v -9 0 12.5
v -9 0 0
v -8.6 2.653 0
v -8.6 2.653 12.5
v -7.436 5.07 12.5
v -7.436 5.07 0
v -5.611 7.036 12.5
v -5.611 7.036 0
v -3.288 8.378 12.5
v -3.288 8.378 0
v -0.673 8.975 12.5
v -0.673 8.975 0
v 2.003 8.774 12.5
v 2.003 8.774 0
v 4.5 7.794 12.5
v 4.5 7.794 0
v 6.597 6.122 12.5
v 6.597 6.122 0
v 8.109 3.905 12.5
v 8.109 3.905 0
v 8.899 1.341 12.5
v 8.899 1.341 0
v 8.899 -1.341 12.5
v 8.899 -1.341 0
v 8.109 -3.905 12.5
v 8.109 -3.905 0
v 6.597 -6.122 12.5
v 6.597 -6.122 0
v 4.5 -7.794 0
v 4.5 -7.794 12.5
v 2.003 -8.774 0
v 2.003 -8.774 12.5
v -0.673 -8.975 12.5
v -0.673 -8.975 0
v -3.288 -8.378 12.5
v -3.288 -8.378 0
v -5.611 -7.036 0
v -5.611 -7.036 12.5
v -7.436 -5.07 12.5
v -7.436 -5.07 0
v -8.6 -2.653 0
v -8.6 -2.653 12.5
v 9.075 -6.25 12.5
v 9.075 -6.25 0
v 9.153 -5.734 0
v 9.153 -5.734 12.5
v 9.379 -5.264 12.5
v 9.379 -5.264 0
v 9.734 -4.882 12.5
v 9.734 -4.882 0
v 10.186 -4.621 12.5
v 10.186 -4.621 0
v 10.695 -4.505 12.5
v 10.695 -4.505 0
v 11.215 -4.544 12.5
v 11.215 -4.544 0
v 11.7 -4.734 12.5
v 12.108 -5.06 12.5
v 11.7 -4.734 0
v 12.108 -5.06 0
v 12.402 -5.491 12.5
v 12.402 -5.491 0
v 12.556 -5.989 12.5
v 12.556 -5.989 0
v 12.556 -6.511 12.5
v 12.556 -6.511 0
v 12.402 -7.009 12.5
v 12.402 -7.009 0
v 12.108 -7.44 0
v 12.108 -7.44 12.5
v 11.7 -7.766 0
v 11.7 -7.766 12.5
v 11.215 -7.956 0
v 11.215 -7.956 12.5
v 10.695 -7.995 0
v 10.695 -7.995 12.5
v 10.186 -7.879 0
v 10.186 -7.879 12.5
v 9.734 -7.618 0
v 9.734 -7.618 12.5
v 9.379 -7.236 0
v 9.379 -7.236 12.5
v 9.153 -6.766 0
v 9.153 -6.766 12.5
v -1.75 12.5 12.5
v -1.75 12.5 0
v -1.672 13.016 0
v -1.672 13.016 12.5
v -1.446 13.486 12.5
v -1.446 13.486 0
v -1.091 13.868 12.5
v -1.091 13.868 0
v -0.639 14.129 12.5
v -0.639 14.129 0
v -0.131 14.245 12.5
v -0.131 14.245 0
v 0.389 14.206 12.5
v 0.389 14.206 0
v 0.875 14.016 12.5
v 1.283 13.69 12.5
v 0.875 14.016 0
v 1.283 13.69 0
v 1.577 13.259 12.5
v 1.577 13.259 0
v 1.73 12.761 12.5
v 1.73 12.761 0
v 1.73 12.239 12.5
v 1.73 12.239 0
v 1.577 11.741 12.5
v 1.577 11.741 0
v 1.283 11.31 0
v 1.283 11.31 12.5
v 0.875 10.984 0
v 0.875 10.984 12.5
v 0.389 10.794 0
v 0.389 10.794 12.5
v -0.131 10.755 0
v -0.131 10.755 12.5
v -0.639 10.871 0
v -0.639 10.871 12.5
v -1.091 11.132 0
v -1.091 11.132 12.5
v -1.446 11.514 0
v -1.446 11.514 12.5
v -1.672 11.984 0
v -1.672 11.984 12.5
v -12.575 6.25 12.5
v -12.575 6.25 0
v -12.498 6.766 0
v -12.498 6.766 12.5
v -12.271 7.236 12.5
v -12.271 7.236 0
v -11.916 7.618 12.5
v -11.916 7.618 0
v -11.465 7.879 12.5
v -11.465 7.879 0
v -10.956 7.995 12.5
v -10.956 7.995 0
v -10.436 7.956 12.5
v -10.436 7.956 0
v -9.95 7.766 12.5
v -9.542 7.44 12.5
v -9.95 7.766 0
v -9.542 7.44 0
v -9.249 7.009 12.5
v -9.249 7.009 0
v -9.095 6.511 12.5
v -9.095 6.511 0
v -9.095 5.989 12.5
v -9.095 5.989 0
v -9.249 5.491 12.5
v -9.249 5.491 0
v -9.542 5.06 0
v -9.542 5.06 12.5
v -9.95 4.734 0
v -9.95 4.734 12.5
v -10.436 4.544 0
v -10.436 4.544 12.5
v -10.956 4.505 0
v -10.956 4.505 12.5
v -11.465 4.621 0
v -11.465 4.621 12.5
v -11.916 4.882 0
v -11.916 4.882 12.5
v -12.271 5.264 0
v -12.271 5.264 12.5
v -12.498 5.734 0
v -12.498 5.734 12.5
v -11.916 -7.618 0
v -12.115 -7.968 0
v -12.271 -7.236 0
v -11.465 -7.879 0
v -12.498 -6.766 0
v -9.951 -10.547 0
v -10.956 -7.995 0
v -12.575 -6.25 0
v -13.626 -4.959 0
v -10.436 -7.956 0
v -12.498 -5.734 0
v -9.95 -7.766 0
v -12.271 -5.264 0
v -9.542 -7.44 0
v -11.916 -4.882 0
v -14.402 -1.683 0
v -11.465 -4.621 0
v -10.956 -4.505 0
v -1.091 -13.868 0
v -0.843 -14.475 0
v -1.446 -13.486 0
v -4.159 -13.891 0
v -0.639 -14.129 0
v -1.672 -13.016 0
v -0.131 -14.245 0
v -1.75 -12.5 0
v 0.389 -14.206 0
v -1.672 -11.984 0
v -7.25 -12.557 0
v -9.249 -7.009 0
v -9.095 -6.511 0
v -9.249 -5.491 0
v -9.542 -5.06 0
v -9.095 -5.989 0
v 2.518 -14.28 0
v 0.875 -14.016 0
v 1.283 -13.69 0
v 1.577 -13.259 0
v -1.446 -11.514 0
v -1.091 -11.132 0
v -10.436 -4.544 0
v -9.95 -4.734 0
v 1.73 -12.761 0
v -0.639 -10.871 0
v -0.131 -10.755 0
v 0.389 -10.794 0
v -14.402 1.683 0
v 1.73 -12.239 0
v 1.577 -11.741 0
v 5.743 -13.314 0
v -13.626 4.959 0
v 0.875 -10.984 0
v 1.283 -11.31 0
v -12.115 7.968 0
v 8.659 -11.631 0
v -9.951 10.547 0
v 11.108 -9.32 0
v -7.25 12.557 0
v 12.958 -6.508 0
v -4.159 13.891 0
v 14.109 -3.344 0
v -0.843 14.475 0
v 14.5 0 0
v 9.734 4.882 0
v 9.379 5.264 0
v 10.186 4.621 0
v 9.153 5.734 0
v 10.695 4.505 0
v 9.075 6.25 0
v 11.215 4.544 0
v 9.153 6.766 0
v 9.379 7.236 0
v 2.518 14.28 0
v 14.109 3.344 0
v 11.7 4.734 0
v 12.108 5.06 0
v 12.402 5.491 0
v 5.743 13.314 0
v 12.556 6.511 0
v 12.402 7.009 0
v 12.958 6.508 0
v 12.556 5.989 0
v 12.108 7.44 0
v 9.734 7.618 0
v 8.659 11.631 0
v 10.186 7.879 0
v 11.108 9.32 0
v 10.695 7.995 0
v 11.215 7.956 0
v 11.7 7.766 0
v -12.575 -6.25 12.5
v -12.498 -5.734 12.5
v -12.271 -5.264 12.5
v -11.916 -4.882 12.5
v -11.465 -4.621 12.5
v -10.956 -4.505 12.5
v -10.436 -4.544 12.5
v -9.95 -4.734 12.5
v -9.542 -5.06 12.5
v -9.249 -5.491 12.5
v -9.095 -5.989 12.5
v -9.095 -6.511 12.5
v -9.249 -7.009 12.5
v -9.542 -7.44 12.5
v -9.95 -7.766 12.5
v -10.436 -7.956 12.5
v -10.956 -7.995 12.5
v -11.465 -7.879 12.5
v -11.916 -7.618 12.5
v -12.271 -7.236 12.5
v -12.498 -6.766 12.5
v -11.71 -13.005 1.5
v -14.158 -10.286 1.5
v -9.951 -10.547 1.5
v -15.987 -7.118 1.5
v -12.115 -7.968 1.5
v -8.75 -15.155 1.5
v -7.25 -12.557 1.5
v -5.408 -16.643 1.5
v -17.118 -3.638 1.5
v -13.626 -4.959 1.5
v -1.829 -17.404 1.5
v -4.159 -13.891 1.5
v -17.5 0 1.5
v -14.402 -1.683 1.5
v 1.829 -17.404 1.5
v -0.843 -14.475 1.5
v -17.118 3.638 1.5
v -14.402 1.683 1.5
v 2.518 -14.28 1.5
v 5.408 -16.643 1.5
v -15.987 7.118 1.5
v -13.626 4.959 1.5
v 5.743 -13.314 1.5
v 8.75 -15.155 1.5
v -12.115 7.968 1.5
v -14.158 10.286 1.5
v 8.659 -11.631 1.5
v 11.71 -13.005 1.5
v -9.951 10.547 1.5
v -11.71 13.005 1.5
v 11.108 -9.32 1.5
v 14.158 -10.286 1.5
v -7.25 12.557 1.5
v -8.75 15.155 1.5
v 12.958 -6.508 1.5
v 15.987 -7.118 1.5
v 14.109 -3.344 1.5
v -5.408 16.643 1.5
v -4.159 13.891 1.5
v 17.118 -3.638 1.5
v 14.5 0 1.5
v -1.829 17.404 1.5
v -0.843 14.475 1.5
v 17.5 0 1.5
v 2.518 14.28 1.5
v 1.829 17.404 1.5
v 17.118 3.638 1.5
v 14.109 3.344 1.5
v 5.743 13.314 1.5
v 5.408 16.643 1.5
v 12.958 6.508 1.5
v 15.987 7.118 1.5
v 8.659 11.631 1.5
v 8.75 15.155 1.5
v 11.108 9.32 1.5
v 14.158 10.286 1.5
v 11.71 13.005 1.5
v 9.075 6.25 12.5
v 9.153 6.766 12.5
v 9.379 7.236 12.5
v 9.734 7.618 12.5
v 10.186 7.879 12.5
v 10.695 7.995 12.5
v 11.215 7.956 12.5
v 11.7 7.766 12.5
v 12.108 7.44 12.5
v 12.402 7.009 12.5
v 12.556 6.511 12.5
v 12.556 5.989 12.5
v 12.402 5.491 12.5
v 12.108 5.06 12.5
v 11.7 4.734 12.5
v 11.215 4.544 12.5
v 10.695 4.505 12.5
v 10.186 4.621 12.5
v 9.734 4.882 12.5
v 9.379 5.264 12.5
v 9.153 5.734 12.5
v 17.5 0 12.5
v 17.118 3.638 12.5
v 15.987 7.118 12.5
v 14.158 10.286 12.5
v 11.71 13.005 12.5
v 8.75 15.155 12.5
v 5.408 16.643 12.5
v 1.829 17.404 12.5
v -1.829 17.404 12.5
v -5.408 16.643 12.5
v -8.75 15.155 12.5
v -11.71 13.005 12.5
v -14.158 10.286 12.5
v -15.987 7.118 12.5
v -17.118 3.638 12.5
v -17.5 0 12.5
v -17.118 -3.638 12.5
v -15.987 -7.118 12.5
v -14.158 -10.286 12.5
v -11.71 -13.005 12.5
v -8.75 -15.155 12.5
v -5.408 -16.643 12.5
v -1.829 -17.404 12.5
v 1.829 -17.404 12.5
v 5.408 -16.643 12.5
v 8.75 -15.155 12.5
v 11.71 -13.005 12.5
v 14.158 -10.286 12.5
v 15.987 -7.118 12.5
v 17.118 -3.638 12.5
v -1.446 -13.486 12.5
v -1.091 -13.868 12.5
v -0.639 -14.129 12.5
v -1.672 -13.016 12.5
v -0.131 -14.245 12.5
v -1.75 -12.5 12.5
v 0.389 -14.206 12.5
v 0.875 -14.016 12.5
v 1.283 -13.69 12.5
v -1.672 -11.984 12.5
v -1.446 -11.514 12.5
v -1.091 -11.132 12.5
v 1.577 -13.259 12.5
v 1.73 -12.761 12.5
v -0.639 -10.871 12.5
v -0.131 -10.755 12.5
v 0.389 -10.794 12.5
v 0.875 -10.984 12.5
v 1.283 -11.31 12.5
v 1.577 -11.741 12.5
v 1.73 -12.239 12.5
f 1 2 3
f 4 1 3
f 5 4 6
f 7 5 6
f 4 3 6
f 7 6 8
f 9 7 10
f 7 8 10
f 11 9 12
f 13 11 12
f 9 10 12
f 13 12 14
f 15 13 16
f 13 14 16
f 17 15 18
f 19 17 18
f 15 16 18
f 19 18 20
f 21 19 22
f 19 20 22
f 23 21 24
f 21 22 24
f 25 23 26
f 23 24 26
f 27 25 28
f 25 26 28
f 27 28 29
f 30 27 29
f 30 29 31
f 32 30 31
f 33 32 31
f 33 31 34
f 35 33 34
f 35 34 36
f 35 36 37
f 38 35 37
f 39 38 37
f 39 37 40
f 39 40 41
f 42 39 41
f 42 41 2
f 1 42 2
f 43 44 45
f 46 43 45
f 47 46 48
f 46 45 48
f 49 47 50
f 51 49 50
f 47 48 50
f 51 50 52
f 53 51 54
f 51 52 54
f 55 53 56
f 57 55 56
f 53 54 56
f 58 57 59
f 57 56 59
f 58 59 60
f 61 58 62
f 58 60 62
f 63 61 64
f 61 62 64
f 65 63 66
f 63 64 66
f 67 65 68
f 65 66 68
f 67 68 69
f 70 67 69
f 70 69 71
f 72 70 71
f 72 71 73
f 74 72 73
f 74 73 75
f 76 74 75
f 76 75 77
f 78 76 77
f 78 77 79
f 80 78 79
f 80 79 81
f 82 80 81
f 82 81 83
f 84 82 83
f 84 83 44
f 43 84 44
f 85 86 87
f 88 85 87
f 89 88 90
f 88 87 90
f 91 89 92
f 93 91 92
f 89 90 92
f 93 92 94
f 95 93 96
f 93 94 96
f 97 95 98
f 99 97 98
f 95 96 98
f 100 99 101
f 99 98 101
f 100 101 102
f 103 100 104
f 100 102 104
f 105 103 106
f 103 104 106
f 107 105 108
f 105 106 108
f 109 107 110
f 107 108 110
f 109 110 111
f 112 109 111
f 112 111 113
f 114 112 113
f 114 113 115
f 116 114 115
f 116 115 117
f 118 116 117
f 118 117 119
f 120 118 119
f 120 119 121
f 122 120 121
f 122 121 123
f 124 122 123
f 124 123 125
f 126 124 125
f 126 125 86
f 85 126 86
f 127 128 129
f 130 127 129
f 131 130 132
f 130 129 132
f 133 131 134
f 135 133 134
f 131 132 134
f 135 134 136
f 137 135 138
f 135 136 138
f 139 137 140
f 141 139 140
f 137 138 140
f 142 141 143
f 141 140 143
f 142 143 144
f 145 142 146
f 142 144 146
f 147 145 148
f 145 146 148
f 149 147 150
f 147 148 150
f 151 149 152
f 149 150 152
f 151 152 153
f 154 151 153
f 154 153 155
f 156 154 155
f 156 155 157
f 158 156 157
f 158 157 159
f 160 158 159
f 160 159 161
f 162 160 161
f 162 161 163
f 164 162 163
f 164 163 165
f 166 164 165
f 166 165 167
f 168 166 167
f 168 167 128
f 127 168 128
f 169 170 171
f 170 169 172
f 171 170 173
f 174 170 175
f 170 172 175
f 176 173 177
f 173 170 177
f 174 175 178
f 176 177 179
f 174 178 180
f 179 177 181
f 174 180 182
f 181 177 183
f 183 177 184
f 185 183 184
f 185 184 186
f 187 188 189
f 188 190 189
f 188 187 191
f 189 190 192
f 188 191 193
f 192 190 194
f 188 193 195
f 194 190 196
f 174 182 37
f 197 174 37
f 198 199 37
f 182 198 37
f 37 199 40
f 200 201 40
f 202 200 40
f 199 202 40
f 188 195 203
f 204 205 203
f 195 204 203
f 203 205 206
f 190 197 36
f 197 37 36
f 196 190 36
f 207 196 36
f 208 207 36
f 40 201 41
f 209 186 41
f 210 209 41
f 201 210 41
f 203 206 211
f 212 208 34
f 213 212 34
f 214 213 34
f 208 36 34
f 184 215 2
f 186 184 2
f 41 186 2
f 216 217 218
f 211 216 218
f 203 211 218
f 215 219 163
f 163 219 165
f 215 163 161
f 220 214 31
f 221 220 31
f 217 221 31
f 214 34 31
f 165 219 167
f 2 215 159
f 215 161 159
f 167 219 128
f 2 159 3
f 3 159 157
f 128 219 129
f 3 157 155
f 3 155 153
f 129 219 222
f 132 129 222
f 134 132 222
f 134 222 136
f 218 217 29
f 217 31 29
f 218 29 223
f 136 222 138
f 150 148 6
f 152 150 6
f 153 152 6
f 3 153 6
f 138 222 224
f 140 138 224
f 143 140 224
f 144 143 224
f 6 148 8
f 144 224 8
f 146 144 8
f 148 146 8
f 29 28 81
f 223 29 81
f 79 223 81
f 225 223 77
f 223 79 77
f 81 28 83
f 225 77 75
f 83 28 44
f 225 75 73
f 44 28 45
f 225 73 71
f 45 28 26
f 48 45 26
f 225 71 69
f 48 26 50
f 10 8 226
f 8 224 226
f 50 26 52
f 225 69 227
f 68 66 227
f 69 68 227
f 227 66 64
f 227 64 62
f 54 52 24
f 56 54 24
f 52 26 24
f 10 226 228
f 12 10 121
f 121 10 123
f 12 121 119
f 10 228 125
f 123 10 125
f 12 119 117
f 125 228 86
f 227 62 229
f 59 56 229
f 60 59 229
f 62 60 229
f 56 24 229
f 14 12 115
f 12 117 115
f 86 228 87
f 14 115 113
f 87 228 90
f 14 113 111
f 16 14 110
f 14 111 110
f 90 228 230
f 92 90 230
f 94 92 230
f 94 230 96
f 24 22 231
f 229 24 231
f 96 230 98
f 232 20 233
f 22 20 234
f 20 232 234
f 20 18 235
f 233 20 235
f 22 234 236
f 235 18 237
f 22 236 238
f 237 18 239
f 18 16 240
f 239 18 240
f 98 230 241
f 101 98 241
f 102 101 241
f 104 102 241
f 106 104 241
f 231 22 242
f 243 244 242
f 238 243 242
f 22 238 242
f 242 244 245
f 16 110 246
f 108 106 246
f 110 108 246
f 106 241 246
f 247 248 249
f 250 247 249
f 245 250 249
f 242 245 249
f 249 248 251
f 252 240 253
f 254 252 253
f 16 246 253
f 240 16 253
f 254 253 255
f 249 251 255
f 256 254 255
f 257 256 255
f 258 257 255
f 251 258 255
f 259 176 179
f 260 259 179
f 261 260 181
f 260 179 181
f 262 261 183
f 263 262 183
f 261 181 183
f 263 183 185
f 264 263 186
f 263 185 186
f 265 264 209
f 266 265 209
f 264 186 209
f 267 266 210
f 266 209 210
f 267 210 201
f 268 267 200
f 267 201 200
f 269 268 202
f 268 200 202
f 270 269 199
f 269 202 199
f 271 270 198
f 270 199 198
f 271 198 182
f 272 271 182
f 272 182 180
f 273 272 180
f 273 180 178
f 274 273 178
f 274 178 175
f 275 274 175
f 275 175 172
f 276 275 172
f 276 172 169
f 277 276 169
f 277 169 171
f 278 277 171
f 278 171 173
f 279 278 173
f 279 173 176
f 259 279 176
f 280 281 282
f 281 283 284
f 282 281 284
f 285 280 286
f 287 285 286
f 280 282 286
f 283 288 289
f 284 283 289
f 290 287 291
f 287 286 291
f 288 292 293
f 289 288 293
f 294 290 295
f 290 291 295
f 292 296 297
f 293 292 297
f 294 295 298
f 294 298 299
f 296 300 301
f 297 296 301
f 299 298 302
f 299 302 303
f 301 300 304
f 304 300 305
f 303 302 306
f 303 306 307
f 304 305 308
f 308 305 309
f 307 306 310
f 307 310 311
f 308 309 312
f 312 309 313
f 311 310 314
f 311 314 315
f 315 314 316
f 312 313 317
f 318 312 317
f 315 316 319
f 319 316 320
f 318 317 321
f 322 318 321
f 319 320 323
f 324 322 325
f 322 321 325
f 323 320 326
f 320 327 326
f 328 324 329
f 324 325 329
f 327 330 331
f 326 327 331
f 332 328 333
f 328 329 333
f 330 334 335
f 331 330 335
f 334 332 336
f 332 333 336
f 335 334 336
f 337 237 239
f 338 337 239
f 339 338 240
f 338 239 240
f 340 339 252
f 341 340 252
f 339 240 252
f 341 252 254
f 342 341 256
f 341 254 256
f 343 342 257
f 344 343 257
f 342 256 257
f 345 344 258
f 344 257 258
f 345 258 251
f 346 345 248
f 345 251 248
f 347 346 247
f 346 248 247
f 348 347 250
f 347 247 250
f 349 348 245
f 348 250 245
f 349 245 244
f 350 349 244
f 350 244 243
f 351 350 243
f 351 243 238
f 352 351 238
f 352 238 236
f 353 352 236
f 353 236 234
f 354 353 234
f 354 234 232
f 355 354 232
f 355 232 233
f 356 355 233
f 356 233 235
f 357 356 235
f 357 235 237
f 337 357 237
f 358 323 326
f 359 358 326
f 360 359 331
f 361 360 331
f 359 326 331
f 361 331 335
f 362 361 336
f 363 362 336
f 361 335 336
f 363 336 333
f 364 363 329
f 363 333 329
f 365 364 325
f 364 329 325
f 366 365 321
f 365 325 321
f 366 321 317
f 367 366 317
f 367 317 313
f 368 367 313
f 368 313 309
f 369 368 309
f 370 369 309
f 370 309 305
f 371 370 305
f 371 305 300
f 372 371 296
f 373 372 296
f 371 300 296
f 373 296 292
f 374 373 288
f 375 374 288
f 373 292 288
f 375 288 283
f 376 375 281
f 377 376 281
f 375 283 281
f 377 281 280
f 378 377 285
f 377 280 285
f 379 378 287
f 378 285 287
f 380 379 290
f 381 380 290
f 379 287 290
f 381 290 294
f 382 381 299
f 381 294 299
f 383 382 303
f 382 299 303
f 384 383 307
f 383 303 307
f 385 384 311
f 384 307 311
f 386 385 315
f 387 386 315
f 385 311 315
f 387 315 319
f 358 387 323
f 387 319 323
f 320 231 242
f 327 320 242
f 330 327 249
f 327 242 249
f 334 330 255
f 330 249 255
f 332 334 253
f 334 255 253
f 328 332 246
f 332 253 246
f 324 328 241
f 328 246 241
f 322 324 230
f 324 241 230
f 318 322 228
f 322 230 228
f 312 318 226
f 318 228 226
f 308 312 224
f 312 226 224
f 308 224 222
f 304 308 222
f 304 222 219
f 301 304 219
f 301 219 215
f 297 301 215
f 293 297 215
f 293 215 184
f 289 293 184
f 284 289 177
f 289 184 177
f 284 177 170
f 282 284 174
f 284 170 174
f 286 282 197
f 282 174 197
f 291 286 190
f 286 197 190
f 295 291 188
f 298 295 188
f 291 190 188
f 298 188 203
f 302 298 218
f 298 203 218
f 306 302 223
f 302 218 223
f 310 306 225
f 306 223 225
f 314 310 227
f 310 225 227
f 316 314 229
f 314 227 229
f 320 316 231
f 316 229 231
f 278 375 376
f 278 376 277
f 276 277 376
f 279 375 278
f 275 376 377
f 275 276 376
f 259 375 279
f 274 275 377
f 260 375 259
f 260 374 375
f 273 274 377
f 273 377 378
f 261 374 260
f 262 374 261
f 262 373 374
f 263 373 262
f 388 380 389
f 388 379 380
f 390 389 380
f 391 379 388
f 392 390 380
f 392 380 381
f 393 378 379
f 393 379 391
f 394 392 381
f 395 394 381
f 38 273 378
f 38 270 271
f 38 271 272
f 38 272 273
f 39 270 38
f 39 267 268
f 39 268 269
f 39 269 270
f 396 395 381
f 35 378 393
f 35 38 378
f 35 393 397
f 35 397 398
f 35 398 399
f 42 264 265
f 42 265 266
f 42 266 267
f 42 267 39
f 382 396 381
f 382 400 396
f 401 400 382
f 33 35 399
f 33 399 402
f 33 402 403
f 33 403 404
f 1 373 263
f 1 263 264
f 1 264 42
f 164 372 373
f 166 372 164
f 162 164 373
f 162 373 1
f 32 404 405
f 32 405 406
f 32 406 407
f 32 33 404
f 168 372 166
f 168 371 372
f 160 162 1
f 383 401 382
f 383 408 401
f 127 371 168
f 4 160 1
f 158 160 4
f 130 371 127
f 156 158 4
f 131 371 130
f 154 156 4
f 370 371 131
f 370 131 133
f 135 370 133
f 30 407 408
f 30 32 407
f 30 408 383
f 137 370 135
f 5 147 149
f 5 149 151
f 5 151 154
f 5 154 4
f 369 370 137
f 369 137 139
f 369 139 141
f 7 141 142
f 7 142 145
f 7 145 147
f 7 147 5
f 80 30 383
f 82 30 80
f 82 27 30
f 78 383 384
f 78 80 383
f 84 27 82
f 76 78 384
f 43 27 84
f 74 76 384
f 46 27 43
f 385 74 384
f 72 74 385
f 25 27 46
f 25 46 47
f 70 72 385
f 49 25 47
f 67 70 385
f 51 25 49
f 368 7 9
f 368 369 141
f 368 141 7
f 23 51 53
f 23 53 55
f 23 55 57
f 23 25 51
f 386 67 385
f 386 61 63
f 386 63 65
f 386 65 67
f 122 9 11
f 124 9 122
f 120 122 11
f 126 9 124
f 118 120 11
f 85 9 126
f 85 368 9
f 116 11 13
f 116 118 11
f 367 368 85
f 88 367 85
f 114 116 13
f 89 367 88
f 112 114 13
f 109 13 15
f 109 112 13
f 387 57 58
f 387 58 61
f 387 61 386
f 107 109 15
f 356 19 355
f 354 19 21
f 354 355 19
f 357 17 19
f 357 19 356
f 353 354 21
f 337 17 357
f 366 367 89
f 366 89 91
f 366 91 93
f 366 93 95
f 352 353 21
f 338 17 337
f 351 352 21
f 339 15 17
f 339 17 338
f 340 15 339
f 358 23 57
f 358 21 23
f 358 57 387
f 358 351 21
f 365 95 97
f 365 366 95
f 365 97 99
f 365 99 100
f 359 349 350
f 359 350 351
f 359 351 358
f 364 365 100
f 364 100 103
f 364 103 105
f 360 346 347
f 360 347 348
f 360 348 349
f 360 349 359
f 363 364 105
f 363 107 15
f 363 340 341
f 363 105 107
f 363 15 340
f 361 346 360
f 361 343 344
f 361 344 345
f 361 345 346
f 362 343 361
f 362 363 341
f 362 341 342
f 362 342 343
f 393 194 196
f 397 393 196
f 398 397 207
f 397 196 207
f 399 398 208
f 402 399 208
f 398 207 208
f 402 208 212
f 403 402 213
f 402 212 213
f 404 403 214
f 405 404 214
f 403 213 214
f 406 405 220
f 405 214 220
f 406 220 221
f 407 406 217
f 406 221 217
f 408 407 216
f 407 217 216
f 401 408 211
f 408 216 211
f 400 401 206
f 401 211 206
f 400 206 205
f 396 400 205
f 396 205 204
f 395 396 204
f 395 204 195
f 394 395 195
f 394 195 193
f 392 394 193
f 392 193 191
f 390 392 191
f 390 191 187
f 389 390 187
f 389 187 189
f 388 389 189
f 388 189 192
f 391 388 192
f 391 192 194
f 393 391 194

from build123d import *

# Parameters (mm, degrees)
SKETCH_1_R          = 14.5
EXTRUDE_1_DEPTH     = 1.5
SKETCH_2_R          = 17.5
EXTRUDE_2_DEPTH     = 11
SKETCH_3_R          = 1.75
SKETCH_3_R_2        = 9
CUT_EXTRUDE_1_DEPTH = 26.5


with BuildPart() as part:
    # 草图1 → 凸台-拉伸1 (new body)
    with BuildSketch(Plane.XY):
        Circle(SKETCH_1_R)
    extrude(amount=EXTRUDE_1_DEPTH)

    # 草图2 → 凸台-拉伸2 (add)
    with BuildSketch(Plane.XY.offset(1.5)):
        Circle(SKETCH_2_R)
    extrude(amount=EXTRUDE_2_DEPTH)

    # 草图3 → 切除-拉伸1 (cut)
    with BuildSketch(Plane(origin=(0, 0, 0), x_dir=(-1, 0, 0), z_dir=(0, 0, -1))):
        with Locations((0, 12.5)):
            Circle(SKETCH_3_R)
        Circle(SKETCH_3_R_2)
        with Locations((10.825317547, 6.25)):
            Circle(SKETCH_3_R)
        with Locations((10.825317547, -6.25)):
            Circle(SKETCH_3_R)
        with Locations((0, -12.5)):
            Circle(SKETCH_3_R)
        with Locations((-10.825317547, -6.25)):
            Circle(SKETCH_3_R)
        with Locations((-10.825317547, 6.25)):
            Circle(SKETCH_3_R)
    extrude(amount=-CUT_EXTRUDE_1_DEPTH, mode=Mode.SUBTRACT)


solid = part.part
